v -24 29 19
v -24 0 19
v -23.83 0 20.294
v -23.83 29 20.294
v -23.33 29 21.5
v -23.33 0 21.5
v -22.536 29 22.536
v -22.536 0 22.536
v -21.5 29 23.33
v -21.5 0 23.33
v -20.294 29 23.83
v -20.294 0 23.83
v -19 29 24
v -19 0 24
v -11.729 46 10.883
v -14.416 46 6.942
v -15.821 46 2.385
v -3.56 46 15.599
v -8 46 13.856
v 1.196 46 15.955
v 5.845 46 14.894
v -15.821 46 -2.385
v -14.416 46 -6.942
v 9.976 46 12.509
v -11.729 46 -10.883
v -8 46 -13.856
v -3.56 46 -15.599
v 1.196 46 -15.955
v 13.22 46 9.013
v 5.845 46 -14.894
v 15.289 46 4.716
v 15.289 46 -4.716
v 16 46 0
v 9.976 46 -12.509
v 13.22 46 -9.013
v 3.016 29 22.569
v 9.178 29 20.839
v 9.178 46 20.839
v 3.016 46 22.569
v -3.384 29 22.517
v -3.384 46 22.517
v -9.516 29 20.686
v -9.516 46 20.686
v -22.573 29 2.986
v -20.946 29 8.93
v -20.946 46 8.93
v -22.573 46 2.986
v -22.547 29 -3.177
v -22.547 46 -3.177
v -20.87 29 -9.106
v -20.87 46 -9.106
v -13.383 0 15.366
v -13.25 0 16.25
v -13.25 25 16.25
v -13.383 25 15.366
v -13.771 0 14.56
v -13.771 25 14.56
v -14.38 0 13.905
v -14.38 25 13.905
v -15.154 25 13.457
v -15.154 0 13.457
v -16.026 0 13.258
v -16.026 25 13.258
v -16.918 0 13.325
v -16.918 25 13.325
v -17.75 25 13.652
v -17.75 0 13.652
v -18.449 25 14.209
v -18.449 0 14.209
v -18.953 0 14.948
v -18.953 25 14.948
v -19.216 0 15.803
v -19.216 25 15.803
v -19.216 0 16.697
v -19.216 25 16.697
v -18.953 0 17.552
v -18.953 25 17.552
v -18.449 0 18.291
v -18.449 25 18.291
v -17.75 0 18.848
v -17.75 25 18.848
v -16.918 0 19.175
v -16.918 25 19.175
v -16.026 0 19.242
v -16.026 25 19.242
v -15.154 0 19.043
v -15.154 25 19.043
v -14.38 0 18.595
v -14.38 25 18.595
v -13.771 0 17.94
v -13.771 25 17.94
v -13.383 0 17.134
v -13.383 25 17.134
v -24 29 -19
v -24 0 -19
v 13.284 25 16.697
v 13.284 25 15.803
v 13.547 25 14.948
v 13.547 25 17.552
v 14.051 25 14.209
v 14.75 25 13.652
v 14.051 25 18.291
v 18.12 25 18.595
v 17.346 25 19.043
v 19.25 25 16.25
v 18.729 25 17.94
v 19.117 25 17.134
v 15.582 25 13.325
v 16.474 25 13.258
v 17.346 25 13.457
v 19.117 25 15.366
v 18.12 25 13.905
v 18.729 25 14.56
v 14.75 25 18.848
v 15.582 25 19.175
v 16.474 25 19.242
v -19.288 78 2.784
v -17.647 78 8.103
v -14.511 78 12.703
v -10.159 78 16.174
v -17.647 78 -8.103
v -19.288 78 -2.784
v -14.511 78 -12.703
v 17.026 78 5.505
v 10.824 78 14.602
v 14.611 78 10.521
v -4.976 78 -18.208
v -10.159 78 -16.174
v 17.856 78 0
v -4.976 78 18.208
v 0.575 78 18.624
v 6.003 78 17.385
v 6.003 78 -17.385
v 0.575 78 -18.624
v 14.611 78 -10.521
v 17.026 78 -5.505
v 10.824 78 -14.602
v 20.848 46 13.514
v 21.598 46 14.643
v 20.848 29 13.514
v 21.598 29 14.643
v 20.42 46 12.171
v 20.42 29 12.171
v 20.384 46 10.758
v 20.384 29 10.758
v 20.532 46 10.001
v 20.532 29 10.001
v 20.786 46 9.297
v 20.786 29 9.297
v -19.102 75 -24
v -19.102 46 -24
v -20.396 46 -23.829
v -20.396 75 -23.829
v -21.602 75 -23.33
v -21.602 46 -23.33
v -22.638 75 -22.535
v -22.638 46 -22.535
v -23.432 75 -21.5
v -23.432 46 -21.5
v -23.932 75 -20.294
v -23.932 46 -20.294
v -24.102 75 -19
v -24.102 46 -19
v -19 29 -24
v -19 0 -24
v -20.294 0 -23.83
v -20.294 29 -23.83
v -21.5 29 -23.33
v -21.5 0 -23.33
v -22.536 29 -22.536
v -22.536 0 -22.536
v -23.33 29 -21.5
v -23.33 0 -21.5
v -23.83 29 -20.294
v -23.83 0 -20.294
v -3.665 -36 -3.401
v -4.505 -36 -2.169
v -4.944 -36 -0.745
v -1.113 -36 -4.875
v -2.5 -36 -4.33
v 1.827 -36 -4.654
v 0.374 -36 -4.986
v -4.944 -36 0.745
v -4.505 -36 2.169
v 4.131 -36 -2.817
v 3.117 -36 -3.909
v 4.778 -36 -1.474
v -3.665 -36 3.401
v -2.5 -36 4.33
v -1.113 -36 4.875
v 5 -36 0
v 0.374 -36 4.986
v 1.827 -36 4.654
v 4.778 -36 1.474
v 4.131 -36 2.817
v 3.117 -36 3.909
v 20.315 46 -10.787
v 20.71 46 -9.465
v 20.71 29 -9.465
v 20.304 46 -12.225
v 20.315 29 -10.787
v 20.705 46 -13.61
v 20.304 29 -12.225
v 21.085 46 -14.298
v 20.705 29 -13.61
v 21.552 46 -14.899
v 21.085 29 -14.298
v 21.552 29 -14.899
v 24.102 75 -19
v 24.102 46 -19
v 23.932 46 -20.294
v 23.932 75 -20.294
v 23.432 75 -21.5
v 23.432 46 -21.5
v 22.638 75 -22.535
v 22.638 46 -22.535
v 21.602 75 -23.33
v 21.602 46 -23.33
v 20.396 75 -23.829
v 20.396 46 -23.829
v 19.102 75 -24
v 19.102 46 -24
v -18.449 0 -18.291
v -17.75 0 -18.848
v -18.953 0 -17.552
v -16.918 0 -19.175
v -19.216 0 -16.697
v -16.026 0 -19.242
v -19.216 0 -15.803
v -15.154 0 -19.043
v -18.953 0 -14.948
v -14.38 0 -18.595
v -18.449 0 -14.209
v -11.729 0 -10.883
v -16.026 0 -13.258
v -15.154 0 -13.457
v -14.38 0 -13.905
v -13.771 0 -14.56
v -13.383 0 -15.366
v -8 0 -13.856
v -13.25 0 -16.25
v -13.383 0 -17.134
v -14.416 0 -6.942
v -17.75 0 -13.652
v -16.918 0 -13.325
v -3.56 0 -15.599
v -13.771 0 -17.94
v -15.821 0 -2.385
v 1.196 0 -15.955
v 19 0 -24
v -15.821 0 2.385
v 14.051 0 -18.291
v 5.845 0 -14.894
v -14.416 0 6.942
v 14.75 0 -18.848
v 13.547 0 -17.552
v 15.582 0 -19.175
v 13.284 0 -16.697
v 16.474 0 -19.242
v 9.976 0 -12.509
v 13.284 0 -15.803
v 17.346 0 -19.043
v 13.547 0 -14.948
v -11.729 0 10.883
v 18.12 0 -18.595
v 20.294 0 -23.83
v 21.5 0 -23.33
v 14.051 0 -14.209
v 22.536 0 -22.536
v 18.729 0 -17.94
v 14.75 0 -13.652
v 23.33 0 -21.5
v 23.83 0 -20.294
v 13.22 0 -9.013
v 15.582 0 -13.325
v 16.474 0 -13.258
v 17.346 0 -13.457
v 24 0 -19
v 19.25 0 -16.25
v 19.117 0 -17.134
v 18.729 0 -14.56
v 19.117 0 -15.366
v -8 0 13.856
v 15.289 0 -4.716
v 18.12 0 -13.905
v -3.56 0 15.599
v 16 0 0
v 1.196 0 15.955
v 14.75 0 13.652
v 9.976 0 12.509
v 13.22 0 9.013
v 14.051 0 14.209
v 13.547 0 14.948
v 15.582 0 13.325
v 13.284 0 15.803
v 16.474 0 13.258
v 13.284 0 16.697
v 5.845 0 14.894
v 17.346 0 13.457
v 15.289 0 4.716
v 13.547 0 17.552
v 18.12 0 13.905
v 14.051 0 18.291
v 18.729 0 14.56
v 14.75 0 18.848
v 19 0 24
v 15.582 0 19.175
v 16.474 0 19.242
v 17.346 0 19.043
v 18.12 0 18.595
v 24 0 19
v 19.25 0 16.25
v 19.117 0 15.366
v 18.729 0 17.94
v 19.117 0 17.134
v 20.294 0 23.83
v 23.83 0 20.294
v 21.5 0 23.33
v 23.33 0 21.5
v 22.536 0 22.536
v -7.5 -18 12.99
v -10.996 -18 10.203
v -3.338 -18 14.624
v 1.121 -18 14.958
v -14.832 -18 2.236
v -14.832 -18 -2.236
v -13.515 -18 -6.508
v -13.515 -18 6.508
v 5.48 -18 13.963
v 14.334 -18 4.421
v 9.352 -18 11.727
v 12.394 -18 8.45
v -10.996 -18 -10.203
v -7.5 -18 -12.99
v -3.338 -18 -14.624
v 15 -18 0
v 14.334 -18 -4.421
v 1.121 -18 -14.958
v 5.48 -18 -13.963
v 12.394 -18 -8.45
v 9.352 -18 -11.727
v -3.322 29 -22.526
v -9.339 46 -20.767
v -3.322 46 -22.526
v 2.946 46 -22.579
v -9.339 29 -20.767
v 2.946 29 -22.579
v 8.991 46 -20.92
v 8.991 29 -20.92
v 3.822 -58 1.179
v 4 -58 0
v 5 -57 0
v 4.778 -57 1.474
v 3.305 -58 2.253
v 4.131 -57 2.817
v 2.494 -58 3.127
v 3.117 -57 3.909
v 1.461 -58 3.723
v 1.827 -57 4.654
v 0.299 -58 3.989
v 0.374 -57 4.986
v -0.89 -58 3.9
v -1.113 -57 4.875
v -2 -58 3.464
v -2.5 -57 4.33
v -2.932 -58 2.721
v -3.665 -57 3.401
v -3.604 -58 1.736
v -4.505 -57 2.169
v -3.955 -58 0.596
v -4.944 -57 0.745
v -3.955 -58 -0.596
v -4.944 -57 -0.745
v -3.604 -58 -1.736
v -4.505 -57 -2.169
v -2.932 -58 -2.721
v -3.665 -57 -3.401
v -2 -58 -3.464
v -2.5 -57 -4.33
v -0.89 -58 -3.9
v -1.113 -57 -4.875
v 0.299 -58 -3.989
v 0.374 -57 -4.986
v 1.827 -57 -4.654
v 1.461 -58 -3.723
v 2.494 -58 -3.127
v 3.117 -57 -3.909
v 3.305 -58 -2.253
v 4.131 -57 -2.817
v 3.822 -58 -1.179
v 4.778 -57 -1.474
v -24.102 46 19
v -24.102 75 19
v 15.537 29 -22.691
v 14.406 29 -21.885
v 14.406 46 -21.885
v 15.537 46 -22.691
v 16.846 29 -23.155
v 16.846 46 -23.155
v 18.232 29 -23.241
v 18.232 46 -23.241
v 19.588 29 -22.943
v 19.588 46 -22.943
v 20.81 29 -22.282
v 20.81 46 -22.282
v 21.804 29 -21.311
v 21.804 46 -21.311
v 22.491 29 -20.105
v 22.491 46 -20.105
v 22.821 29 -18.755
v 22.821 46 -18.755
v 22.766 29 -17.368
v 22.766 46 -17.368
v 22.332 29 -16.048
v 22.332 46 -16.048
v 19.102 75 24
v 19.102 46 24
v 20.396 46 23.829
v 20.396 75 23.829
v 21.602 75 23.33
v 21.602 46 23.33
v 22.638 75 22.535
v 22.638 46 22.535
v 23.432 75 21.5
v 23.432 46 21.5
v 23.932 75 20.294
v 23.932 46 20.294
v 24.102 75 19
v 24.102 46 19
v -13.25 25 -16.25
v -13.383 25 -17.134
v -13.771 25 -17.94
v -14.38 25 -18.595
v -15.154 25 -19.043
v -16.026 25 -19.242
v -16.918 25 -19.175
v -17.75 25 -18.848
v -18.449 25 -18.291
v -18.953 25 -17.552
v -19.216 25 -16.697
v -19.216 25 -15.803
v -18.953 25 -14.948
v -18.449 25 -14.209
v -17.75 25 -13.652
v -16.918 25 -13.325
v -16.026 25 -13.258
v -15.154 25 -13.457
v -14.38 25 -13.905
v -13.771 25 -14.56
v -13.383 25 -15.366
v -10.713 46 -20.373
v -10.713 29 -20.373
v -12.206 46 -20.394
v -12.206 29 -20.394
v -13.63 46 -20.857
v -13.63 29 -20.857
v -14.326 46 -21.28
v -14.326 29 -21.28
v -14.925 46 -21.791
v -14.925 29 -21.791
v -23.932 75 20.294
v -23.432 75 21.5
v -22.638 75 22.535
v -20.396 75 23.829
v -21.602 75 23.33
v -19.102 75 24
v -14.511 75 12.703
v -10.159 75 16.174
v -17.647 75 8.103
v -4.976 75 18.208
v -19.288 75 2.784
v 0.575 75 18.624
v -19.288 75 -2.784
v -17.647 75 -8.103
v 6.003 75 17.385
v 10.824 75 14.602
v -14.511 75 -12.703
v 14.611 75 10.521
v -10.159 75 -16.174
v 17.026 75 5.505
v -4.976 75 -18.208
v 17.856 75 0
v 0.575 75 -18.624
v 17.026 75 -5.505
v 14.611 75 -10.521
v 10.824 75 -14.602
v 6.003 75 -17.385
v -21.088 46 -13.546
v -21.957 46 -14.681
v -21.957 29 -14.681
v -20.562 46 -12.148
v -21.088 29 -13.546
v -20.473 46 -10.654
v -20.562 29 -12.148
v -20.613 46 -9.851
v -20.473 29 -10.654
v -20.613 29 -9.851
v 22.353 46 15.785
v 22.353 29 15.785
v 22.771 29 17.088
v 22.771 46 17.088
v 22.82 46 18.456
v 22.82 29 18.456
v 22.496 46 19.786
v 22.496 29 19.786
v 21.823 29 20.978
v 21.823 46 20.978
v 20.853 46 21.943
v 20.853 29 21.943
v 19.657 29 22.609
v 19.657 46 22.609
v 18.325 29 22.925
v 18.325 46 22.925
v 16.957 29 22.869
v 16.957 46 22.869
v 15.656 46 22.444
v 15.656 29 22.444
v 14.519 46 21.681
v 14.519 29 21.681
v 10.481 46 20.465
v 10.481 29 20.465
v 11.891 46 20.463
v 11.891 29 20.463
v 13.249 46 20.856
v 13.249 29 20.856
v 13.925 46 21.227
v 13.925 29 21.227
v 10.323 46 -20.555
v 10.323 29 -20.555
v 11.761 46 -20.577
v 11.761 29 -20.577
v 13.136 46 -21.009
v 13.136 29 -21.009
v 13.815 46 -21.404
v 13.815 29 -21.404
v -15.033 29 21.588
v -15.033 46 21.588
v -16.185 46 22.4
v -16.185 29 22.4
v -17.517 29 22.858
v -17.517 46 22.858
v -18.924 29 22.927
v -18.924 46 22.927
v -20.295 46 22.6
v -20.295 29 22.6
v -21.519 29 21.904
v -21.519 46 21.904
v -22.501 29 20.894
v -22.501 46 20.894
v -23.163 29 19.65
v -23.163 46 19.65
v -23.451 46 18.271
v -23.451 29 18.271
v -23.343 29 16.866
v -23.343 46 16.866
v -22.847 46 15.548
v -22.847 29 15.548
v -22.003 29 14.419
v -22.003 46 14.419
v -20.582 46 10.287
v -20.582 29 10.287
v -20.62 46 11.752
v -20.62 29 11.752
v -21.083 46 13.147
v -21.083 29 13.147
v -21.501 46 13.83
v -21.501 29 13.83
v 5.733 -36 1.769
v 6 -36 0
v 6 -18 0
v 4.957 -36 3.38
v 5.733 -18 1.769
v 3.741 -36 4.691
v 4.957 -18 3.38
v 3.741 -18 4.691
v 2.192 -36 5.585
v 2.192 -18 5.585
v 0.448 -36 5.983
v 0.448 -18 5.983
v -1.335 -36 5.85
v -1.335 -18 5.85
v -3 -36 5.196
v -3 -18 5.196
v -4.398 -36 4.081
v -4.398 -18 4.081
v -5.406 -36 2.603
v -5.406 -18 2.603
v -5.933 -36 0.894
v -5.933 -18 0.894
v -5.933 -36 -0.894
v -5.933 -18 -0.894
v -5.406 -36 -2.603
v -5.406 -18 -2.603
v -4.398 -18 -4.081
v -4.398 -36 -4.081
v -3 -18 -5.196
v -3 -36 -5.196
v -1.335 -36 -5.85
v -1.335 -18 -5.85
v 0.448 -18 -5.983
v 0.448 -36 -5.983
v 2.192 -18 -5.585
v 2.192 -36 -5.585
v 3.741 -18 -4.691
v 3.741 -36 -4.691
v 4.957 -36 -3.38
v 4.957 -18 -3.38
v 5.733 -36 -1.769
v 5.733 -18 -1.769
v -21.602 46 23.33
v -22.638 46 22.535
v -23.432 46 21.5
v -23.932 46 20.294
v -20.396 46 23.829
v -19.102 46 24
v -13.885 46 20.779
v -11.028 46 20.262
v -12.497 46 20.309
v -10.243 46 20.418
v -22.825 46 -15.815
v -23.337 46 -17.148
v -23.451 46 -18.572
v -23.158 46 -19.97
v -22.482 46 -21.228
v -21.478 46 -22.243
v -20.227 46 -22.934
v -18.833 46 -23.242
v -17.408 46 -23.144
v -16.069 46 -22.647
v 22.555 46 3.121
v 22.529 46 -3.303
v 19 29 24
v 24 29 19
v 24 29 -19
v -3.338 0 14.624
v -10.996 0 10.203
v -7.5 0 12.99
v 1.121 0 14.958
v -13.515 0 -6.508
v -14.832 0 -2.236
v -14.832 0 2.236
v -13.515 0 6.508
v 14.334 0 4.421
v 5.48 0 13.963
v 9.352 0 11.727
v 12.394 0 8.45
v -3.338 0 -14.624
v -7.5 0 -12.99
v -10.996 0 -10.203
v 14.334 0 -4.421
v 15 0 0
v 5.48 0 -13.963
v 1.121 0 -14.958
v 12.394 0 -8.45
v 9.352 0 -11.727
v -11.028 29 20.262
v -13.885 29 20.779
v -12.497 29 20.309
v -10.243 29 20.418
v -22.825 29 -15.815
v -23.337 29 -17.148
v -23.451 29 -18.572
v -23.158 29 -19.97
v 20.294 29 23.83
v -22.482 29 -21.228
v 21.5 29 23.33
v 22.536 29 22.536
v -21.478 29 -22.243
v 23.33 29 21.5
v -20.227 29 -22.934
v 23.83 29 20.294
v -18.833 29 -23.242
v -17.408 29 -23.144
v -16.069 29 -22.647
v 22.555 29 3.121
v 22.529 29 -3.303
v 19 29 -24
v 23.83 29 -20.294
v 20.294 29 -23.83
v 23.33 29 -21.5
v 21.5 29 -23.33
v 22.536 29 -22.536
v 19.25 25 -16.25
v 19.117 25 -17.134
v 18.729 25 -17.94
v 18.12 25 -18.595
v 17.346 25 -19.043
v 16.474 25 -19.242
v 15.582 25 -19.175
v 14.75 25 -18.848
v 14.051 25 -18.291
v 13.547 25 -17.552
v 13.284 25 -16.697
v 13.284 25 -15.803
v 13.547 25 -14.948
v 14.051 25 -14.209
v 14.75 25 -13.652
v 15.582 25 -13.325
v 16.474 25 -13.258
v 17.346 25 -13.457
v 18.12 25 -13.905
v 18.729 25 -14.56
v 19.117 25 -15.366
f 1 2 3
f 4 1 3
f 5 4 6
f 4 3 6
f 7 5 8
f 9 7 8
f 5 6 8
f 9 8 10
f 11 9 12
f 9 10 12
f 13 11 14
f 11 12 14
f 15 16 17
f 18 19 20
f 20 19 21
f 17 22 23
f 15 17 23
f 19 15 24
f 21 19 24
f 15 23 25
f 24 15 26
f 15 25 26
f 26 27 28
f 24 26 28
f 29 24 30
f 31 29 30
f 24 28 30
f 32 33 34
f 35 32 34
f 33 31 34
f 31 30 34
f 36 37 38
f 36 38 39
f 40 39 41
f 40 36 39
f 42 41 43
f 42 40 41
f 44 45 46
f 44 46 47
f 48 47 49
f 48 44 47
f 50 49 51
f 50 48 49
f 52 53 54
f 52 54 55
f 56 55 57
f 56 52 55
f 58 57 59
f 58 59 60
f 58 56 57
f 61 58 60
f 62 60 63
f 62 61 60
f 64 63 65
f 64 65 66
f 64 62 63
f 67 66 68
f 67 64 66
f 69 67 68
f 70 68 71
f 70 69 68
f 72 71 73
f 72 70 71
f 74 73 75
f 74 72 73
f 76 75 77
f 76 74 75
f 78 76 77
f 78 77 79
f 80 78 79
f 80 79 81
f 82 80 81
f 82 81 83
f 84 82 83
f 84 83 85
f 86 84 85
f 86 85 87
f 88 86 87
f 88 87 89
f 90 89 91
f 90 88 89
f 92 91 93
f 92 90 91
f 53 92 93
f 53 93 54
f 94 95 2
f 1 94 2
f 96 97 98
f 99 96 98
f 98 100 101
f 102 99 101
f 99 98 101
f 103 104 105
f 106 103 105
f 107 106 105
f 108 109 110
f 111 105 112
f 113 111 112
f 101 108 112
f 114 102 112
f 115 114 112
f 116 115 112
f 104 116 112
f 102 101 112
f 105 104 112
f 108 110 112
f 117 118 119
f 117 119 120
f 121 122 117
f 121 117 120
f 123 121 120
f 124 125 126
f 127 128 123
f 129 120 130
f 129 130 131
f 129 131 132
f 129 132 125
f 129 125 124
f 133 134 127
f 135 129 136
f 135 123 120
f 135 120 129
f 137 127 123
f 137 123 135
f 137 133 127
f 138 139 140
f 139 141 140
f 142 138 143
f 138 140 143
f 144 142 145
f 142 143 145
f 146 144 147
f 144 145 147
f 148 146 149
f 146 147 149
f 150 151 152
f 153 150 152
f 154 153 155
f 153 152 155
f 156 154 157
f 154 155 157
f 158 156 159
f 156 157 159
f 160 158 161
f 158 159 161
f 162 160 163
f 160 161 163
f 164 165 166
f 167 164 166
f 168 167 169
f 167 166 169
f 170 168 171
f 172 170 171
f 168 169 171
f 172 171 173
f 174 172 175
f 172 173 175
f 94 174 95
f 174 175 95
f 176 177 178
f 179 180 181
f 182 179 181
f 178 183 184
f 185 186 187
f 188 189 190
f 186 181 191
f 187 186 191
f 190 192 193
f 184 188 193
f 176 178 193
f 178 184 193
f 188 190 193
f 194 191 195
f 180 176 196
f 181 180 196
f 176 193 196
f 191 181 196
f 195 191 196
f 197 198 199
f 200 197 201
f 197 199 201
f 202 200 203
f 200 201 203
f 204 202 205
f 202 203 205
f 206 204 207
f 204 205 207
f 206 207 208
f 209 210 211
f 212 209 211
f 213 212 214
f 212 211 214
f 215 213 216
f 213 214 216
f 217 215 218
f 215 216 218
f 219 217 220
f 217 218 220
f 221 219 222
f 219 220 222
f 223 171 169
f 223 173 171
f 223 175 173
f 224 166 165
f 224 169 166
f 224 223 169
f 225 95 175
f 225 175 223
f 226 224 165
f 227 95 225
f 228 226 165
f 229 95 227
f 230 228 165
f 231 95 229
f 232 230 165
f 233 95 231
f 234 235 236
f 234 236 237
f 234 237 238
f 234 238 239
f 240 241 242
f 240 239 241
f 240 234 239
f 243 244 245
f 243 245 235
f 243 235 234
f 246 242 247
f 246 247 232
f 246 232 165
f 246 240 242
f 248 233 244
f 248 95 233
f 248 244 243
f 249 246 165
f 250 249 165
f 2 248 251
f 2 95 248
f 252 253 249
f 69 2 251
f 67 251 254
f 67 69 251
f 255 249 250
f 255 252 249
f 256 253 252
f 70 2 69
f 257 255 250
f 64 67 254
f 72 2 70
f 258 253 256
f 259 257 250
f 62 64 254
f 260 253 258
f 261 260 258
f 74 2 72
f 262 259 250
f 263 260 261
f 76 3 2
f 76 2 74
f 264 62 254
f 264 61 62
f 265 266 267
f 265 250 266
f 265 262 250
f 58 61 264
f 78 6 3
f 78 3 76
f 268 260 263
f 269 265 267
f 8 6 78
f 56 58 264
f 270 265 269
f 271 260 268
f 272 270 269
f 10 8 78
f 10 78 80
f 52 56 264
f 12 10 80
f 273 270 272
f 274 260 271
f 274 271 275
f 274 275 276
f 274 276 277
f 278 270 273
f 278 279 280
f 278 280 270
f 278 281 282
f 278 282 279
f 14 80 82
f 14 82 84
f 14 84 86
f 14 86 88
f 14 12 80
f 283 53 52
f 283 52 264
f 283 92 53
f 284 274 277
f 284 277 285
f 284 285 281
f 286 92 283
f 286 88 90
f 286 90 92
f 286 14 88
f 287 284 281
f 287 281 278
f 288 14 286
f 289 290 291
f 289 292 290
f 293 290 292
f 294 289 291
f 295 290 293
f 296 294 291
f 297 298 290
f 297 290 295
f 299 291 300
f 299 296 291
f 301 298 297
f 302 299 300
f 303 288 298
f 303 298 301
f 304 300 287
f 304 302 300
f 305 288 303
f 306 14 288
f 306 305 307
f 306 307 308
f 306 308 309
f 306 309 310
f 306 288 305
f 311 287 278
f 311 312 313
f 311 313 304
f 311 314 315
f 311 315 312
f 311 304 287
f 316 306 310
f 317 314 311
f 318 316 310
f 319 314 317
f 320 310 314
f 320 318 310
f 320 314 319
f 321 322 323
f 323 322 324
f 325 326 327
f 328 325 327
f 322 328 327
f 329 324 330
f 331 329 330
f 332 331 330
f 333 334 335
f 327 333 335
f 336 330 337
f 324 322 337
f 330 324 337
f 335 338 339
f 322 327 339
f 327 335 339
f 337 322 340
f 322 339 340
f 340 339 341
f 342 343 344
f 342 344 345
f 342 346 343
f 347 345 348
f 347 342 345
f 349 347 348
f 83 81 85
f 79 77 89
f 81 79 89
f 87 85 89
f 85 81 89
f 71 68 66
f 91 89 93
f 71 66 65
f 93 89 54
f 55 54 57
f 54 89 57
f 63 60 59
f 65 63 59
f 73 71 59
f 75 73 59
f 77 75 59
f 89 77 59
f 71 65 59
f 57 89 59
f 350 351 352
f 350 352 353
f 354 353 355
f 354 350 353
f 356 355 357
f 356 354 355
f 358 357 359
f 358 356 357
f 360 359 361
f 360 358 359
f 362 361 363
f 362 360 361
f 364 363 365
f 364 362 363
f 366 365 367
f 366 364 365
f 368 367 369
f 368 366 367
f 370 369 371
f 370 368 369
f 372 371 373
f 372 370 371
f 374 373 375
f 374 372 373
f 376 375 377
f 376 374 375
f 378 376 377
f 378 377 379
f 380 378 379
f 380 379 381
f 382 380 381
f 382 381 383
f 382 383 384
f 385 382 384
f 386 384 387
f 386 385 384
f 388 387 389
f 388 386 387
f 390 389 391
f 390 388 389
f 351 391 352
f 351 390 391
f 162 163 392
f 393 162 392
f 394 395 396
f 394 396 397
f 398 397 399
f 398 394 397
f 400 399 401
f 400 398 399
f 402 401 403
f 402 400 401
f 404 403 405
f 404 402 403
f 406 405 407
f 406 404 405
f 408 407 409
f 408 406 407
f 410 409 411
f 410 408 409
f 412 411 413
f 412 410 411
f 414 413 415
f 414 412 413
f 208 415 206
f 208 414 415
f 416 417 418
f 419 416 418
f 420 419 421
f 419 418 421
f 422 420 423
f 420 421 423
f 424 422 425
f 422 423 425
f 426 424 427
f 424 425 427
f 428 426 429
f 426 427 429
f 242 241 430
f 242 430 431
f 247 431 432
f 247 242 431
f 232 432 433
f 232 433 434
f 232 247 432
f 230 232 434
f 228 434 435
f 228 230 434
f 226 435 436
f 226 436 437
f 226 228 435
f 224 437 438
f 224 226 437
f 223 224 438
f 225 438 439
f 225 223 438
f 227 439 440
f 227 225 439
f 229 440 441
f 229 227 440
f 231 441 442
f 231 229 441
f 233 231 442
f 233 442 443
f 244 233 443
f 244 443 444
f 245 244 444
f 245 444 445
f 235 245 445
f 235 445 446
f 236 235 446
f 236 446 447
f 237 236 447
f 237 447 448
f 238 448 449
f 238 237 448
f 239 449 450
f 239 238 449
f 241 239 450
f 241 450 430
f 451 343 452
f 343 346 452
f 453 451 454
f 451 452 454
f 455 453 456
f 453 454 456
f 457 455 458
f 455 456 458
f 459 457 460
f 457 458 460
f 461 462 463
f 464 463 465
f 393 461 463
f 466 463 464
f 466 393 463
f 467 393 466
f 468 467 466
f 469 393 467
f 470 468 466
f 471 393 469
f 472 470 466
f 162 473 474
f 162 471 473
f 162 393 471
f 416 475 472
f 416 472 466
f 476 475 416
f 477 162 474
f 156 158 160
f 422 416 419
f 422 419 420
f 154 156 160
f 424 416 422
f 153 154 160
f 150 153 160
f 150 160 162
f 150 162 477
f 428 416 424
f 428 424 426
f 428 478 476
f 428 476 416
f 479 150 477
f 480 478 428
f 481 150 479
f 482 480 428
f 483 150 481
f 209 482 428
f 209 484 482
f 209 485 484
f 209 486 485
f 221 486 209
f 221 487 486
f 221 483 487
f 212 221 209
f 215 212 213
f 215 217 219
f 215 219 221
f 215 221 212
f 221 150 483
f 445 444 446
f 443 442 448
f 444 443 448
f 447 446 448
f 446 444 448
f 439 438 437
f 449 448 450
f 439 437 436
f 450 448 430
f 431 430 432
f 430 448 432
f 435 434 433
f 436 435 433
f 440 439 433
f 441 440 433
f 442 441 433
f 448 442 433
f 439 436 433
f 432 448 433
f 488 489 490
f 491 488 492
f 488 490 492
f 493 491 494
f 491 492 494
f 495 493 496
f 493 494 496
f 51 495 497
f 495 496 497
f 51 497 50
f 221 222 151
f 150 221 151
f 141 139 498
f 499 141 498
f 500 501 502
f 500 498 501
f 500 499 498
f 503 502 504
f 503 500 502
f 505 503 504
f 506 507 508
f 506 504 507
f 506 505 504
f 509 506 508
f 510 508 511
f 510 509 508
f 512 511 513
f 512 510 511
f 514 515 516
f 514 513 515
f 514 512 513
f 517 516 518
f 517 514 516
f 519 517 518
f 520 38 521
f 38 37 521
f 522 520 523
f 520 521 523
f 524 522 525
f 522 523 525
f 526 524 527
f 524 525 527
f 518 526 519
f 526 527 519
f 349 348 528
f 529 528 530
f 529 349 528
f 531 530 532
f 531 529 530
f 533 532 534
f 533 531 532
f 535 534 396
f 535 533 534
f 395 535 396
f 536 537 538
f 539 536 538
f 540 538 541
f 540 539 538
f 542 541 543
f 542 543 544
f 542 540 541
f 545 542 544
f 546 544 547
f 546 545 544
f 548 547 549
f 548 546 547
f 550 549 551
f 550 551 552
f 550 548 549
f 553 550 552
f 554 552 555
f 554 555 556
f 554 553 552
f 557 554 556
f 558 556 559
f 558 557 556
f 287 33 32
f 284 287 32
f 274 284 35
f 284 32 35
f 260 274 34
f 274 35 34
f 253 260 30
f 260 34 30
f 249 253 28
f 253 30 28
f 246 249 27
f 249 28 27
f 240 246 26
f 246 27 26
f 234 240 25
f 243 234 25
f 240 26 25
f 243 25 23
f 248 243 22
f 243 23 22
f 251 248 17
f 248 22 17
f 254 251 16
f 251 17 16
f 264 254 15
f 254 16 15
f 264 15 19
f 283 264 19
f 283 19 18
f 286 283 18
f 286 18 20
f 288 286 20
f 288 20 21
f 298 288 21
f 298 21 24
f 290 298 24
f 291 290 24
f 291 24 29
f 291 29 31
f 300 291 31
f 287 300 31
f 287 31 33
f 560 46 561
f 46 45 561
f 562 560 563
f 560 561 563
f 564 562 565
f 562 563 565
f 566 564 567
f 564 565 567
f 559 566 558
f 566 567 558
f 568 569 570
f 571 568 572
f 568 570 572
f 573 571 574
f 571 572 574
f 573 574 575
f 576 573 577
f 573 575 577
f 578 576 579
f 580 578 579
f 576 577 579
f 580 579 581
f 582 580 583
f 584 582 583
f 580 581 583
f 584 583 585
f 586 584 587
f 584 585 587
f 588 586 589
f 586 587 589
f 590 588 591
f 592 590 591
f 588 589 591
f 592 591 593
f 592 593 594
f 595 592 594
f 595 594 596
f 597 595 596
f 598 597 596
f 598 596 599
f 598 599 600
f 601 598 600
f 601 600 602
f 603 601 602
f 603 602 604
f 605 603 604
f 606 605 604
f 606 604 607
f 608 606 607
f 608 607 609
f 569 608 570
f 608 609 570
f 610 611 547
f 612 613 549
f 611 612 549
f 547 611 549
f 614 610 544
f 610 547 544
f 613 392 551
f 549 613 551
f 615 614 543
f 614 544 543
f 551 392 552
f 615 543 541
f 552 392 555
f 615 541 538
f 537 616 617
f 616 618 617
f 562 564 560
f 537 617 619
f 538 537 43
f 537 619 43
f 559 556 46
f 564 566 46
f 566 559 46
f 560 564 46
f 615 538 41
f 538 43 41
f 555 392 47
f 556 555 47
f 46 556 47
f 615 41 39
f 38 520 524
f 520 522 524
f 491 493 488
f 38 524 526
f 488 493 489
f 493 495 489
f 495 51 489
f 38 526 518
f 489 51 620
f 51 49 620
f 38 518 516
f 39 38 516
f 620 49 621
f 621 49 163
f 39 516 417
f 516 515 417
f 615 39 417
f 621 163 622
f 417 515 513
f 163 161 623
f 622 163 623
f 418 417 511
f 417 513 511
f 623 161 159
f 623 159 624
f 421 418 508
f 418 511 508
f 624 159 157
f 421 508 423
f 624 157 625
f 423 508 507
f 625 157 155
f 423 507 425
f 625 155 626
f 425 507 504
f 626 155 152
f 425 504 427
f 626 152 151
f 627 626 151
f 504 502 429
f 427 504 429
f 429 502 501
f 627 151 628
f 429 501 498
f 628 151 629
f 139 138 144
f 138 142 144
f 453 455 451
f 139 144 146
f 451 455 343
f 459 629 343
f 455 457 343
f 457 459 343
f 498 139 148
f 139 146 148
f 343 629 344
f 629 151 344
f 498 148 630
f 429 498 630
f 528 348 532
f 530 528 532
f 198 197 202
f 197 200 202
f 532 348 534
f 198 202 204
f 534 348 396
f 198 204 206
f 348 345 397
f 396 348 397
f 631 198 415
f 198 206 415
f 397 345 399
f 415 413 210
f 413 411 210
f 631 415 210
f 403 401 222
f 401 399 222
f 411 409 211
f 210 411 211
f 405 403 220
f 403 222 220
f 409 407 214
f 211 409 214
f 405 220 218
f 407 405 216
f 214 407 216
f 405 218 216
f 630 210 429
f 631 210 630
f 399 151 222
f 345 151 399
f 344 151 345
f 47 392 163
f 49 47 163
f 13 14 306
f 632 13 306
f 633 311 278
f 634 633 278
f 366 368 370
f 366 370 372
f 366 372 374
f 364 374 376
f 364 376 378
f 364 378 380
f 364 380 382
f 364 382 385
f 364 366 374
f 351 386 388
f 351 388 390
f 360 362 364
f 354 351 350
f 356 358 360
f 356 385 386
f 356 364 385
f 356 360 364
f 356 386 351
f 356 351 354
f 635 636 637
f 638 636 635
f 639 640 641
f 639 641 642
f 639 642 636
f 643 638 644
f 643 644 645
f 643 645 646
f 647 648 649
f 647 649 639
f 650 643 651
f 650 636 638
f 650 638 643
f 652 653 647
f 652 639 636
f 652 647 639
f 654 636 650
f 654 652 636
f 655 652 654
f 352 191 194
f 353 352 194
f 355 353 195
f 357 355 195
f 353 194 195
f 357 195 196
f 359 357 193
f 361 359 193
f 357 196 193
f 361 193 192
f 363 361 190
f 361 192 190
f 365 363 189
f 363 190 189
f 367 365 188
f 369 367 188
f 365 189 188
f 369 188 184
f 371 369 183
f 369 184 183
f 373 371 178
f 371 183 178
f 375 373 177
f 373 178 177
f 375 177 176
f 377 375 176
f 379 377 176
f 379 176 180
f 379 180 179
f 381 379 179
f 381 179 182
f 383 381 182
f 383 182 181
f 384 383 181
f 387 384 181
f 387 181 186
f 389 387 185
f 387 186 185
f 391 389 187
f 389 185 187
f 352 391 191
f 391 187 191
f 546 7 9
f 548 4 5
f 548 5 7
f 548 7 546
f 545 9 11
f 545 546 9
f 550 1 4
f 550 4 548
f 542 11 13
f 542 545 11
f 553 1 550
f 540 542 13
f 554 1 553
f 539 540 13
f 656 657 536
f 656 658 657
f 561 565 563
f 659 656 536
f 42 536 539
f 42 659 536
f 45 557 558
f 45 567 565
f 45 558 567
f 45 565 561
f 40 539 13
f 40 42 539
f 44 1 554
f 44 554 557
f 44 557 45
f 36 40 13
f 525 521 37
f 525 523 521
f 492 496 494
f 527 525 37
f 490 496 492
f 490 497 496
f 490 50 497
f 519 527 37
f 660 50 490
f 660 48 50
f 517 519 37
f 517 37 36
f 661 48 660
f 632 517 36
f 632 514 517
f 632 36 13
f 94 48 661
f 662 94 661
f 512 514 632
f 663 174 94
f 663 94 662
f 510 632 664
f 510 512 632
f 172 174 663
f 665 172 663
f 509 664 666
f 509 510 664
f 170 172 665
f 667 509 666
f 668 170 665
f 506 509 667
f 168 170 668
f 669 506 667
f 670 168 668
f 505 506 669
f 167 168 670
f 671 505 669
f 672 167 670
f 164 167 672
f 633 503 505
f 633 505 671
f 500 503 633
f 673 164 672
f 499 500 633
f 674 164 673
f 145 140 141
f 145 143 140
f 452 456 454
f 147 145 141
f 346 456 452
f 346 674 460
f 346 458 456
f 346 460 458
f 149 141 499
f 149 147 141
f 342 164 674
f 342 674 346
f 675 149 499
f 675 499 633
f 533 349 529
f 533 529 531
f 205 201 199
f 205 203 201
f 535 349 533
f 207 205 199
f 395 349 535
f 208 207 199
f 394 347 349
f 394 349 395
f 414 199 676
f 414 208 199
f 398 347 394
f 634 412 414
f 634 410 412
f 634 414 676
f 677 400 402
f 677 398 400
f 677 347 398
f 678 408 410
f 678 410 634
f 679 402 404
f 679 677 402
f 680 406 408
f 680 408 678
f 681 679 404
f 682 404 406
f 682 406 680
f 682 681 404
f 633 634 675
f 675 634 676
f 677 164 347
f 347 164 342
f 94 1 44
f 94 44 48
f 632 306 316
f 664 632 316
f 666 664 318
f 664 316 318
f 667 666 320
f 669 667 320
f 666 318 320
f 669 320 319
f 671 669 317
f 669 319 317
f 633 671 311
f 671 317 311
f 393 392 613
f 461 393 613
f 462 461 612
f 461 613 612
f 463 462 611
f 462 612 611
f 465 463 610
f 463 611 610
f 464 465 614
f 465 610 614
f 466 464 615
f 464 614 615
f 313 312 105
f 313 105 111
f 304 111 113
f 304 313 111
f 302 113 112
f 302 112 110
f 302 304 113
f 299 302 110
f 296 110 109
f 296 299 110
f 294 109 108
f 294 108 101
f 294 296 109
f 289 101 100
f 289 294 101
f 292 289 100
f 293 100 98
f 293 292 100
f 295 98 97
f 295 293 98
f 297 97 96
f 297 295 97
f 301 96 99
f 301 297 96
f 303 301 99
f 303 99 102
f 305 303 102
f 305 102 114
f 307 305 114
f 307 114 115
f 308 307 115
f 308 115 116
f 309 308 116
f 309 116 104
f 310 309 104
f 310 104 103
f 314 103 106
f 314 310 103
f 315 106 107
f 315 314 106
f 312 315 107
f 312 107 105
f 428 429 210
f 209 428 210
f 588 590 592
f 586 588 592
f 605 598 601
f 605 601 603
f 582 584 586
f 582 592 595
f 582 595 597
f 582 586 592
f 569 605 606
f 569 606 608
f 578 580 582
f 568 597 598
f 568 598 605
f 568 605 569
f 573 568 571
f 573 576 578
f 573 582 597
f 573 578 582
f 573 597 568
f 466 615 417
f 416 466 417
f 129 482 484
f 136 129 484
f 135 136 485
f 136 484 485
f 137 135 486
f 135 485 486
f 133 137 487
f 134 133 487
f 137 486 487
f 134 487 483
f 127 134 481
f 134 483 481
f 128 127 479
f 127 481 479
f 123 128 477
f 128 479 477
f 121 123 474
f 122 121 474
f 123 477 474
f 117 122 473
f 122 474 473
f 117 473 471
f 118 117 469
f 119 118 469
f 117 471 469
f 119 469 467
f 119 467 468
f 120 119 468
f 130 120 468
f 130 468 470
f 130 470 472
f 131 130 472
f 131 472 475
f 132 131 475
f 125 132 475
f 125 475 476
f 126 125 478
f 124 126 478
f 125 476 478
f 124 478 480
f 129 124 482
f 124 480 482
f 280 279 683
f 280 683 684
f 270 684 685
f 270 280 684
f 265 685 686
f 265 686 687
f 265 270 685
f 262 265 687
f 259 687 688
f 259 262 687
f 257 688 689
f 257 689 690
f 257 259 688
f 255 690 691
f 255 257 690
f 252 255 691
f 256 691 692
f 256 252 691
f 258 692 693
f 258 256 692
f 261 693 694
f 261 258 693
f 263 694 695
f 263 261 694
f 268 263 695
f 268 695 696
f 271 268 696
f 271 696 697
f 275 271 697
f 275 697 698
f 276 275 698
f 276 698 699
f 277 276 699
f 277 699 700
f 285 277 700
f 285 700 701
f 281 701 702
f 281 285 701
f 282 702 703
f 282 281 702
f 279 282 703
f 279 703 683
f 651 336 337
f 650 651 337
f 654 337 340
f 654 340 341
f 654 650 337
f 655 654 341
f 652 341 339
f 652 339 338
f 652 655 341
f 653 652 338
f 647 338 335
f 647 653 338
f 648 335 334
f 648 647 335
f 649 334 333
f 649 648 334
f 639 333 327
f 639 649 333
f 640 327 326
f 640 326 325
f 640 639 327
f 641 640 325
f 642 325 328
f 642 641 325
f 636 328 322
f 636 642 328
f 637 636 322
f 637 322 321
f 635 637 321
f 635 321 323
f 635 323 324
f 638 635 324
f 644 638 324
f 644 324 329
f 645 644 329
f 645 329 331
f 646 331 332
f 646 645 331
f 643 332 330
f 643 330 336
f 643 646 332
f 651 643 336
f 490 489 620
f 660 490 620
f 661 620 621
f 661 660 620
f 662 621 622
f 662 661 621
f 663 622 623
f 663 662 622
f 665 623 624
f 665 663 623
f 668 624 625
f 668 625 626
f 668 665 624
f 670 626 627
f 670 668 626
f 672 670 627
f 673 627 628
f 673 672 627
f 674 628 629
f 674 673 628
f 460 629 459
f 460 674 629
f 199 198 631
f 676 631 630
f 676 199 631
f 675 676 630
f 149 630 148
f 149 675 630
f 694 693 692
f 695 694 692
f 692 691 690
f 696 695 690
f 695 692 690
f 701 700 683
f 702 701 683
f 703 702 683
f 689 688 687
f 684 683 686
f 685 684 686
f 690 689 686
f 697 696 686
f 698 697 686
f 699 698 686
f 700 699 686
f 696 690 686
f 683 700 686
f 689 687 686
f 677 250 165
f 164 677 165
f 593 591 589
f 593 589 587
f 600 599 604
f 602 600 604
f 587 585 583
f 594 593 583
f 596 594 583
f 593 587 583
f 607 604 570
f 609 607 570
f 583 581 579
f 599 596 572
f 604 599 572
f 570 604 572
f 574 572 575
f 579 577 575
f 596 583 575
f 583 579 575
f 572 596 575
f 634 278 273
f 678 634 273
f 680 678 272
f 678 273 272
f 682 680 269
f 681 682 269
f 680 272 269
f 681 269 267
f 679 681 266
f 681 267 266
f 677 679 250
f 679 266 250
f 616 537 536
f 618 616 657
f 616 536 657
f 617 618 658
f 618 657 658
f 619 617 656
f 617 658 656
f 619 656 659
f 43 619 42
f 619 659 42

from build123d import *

# Parameters (mm, degrees)
SALIENTE_EXTRUIR1_DEPTH  = 29
CROQUIS2_R               = 22.770045983
SALIENTE_EXTRUIR2_DEPTH  = 46
CROQUIS3_R               = 16
CORTAR_EXTRUIR2_DEPTH    = 90
CROQUIS4_R               = 5
SALIENTE_EXTRUIR3_DEPTH  = 65
REDONDEO1_R              = 5
SALIENTE_EXTRUIR4_DEPTH  = 29
CROQUIS6_R               = 18.676439513
SALIENTE_EXTRUIR5_DEPTH  = 3
CROQUIS7_R               = 3
CORTAR_EXTRUIR3_DEPTH    = 25
CROQUIS8_R               = 15
SALIENTE_EXTRUIR7_DEPTH  = 18
CROQUIS9_R               = 6
SALIENTE_EXTRUIR9_DEPTH  = 18
CROQUIS10_R              = 5
SALIENTE_EXTRUIR11_DEPTH = 22
CHAFL_N1_SIZE            = 1


with BuildPart() as part:
    # Croquis1 → Saliente-Extruir1 (new body)
    with BuildSketch(Plane(origin=(0, 0, 0), x_dir=(1, 0, 0), z_dir=(0, 1, 0))):
        with BuildLine():
            Line((-19, -24), (19, -24))
            ThreePointArc((19, -24), (22.535533906, -22.535533906), (24, -19))
            Line((24, -19), (24, 19))
            ThreePointArc((24, 19), (22.535533906, 22.535533906), (19, 24))
            Line((19, 24), (-19, 24))
            ThreePointArc((-19, 24), (-22.535533906, 22.535533906), (-24, 19))
            Line((-24, 19), (-24, -19))
            ThreePointArc((-24, -19), (-22.535533906, -22.535533906), (-19, -24))
        make_face()
    extrude(amount=SALIENTE_EXTRUIR1_DEPTH)

    # Croquis2 → Saliente-Extruir2 (add)
    with BuildSketch(Plane.XZ):
        Circle(CROQUIS2_R)
    extrude(amount=-SALIENTE_EXTRUIR2_DEPTH)

    # Croquis3 → Cortar-Extruir2 (cut)
    with BuildSketch(Plane(origin=(0, 46, 0), x_dir=(1, 0, 0), z_dir=(0, 1, 0))):
        Circle(CROQUIS3_R)
    extrude(amount=-CORTAR_EXTRUIR2_DEPTH, mode=Mode.SUBTRACT)

    # Croquis4 → Saliente-Extruir3 (add)
    with BuildSketch(Plane.XZ):
        with Locations((17.845802116, 17.948364197)):
            Circle(CROQUIS4_R)
        with Locations((-18.461174602, 17.948364197)):
            Circle(CROQUIS4_R)
        with Locations((-18.461174602, -18.25605044)):
            Circle(CROQUIS4_R)
        with Locations((17.845802116, -18.25605044)):
            Circle(CROQUIS4_R)
    extrude(amount=-SALIENTE_EXTRUIR3_DEPTH)

    # Redondeo1
    redondeo1_edges = [part.edges().sort_by_distance(p)[0] for p in [
        (12.911388794, 37.5, 18.755560068),
        (18.681261941, 37.5, 13.018657625),
        (-18.725226903, 37.5, 12.955341427),
        (-13.477569022, 37.5, 18.35293239),
        (-13.462342306, 37.5, -18.364104489),
        (-18.513370775, 37.5, -13.256322892),
        (18.484196311, 37.5, -13.296972617),
        (12.873497796, 37.5, -18.78158802),
    ]]
    fillet(redondeo1_edges, radius=REDONDEO1_R)

    # Croquis5 → Saliente-Extruir4 (add)
    with BuildSketch(Plane(origin=(0, 46, 0), x_dir=(1, 0, 0), z_dir=(0, 1, 0))):
        with BuildLine():
            Line((-19.102089064, -23.999526983), (19.102089064, -23.999526983))
            ThreePointArc((19.102089064, -23.999526983), (22.63762297, -22.535060889), (24.102089064, -18.999526983))
            Line((24.102089064, -18.999526983), (24.102089064, 18.999526983))
            ThreePointArc((24.102089064, 18.999526983), (22.63762297, 22.535060889), (19.102089064, 23.999526983))
            Line((19.102089064, 23.999526983), (-19.102089064, 23.999526983))
            ThreePointArc((-19.102089064, 23.999526983), (-22.63762297, 22.535060889), (-24.102089064, 18.999526983))
            Line((-24.102089064, 18.999526983), (-24.102089064, -18.999526983))
            ThreePointArc((-24.102089064, -18.999526983), (-22.63762297, -22.535060889), (-19.102089064, -23.999526983))
        make_face()
    extrude(amount=SALIENTE_EXTRUIR4_DEPTH)

    # Croquis6 → Saliente-Extruir5 (add)
    with BuildSketch(Plane(origin=(0, 75, 0), x_dir=(1, 0, 0), z_dir=(0, 1, 0))):
        with Locations((-0.820496649, 0)):
            Circle(CROQUIS6_R)
    extrude(amount=SALIENTE_EXTRUIR5_DEPTH)

    # Croquis7 → Cortar-Extruir3 (cut)
    with BuildSketch(Plane(origin=(0, 0, 0), x_dir=(1, 0, 0), z_dir=(0, 1, 0))):
        with Locations((-16.25, 16.25)):
            Circle(CROQUIS7_R)
        with Locations((16.25, 16.25)):
            Circle(CROQUIS7_R)
        with Locations((16.25, -16.25)):
            Circle(CROQUIS7_R)
        with Locations((-16.25, -16.25)):
            Circle(CROQUIS7_R)
    extrude(amount=CORTAR_EXTRUIR3_DEPTH, mode=Mode.SUBTRACT)


with BuildPart() as body_2:
    # Croquis8 → Saliente-Extruir7 (new body)
    with BuildSketch(Plane(origin=(0, 0, 0), x_dir=(1, 0, 0), z_dir=(0, 1, 0))):
        Circle(CROQUIS8_R)
    extrude(amount=-SALIENTE_EXTRUIR7_DEPTH)


with BuildPart() as body_3:
    # Croquis9 → Saliente-Extruir9 (new body)
    with BuildSketch(Plane.XZ.offset(18)):
        Circle(CROQUIS9_R)
    extrude(amount=SALIENTE_EXTRUIR9_DEPTH)


with BuildPart() as body_4:
    # Croquis10 → Saliente-Extruir11 (new body)
    with BuildSketch(Plane.XZ.offset(36)):
        Circle(CROQUIS10_R)
    extrude(amount=SALIENTE_EXTRUIR11_DEPTH)

    # Chaflán1
    chafl_n1_edges = [body_4.edges().sort_by_distance(p)[0] for p in [
        (-5, -58, 0),
    ]]
    chamfer(chafl_n1_edges, length=CHAFL_N1_SIZE)


solid = Compound([part.part, body_2.part, body_3.part, body_4.part])
